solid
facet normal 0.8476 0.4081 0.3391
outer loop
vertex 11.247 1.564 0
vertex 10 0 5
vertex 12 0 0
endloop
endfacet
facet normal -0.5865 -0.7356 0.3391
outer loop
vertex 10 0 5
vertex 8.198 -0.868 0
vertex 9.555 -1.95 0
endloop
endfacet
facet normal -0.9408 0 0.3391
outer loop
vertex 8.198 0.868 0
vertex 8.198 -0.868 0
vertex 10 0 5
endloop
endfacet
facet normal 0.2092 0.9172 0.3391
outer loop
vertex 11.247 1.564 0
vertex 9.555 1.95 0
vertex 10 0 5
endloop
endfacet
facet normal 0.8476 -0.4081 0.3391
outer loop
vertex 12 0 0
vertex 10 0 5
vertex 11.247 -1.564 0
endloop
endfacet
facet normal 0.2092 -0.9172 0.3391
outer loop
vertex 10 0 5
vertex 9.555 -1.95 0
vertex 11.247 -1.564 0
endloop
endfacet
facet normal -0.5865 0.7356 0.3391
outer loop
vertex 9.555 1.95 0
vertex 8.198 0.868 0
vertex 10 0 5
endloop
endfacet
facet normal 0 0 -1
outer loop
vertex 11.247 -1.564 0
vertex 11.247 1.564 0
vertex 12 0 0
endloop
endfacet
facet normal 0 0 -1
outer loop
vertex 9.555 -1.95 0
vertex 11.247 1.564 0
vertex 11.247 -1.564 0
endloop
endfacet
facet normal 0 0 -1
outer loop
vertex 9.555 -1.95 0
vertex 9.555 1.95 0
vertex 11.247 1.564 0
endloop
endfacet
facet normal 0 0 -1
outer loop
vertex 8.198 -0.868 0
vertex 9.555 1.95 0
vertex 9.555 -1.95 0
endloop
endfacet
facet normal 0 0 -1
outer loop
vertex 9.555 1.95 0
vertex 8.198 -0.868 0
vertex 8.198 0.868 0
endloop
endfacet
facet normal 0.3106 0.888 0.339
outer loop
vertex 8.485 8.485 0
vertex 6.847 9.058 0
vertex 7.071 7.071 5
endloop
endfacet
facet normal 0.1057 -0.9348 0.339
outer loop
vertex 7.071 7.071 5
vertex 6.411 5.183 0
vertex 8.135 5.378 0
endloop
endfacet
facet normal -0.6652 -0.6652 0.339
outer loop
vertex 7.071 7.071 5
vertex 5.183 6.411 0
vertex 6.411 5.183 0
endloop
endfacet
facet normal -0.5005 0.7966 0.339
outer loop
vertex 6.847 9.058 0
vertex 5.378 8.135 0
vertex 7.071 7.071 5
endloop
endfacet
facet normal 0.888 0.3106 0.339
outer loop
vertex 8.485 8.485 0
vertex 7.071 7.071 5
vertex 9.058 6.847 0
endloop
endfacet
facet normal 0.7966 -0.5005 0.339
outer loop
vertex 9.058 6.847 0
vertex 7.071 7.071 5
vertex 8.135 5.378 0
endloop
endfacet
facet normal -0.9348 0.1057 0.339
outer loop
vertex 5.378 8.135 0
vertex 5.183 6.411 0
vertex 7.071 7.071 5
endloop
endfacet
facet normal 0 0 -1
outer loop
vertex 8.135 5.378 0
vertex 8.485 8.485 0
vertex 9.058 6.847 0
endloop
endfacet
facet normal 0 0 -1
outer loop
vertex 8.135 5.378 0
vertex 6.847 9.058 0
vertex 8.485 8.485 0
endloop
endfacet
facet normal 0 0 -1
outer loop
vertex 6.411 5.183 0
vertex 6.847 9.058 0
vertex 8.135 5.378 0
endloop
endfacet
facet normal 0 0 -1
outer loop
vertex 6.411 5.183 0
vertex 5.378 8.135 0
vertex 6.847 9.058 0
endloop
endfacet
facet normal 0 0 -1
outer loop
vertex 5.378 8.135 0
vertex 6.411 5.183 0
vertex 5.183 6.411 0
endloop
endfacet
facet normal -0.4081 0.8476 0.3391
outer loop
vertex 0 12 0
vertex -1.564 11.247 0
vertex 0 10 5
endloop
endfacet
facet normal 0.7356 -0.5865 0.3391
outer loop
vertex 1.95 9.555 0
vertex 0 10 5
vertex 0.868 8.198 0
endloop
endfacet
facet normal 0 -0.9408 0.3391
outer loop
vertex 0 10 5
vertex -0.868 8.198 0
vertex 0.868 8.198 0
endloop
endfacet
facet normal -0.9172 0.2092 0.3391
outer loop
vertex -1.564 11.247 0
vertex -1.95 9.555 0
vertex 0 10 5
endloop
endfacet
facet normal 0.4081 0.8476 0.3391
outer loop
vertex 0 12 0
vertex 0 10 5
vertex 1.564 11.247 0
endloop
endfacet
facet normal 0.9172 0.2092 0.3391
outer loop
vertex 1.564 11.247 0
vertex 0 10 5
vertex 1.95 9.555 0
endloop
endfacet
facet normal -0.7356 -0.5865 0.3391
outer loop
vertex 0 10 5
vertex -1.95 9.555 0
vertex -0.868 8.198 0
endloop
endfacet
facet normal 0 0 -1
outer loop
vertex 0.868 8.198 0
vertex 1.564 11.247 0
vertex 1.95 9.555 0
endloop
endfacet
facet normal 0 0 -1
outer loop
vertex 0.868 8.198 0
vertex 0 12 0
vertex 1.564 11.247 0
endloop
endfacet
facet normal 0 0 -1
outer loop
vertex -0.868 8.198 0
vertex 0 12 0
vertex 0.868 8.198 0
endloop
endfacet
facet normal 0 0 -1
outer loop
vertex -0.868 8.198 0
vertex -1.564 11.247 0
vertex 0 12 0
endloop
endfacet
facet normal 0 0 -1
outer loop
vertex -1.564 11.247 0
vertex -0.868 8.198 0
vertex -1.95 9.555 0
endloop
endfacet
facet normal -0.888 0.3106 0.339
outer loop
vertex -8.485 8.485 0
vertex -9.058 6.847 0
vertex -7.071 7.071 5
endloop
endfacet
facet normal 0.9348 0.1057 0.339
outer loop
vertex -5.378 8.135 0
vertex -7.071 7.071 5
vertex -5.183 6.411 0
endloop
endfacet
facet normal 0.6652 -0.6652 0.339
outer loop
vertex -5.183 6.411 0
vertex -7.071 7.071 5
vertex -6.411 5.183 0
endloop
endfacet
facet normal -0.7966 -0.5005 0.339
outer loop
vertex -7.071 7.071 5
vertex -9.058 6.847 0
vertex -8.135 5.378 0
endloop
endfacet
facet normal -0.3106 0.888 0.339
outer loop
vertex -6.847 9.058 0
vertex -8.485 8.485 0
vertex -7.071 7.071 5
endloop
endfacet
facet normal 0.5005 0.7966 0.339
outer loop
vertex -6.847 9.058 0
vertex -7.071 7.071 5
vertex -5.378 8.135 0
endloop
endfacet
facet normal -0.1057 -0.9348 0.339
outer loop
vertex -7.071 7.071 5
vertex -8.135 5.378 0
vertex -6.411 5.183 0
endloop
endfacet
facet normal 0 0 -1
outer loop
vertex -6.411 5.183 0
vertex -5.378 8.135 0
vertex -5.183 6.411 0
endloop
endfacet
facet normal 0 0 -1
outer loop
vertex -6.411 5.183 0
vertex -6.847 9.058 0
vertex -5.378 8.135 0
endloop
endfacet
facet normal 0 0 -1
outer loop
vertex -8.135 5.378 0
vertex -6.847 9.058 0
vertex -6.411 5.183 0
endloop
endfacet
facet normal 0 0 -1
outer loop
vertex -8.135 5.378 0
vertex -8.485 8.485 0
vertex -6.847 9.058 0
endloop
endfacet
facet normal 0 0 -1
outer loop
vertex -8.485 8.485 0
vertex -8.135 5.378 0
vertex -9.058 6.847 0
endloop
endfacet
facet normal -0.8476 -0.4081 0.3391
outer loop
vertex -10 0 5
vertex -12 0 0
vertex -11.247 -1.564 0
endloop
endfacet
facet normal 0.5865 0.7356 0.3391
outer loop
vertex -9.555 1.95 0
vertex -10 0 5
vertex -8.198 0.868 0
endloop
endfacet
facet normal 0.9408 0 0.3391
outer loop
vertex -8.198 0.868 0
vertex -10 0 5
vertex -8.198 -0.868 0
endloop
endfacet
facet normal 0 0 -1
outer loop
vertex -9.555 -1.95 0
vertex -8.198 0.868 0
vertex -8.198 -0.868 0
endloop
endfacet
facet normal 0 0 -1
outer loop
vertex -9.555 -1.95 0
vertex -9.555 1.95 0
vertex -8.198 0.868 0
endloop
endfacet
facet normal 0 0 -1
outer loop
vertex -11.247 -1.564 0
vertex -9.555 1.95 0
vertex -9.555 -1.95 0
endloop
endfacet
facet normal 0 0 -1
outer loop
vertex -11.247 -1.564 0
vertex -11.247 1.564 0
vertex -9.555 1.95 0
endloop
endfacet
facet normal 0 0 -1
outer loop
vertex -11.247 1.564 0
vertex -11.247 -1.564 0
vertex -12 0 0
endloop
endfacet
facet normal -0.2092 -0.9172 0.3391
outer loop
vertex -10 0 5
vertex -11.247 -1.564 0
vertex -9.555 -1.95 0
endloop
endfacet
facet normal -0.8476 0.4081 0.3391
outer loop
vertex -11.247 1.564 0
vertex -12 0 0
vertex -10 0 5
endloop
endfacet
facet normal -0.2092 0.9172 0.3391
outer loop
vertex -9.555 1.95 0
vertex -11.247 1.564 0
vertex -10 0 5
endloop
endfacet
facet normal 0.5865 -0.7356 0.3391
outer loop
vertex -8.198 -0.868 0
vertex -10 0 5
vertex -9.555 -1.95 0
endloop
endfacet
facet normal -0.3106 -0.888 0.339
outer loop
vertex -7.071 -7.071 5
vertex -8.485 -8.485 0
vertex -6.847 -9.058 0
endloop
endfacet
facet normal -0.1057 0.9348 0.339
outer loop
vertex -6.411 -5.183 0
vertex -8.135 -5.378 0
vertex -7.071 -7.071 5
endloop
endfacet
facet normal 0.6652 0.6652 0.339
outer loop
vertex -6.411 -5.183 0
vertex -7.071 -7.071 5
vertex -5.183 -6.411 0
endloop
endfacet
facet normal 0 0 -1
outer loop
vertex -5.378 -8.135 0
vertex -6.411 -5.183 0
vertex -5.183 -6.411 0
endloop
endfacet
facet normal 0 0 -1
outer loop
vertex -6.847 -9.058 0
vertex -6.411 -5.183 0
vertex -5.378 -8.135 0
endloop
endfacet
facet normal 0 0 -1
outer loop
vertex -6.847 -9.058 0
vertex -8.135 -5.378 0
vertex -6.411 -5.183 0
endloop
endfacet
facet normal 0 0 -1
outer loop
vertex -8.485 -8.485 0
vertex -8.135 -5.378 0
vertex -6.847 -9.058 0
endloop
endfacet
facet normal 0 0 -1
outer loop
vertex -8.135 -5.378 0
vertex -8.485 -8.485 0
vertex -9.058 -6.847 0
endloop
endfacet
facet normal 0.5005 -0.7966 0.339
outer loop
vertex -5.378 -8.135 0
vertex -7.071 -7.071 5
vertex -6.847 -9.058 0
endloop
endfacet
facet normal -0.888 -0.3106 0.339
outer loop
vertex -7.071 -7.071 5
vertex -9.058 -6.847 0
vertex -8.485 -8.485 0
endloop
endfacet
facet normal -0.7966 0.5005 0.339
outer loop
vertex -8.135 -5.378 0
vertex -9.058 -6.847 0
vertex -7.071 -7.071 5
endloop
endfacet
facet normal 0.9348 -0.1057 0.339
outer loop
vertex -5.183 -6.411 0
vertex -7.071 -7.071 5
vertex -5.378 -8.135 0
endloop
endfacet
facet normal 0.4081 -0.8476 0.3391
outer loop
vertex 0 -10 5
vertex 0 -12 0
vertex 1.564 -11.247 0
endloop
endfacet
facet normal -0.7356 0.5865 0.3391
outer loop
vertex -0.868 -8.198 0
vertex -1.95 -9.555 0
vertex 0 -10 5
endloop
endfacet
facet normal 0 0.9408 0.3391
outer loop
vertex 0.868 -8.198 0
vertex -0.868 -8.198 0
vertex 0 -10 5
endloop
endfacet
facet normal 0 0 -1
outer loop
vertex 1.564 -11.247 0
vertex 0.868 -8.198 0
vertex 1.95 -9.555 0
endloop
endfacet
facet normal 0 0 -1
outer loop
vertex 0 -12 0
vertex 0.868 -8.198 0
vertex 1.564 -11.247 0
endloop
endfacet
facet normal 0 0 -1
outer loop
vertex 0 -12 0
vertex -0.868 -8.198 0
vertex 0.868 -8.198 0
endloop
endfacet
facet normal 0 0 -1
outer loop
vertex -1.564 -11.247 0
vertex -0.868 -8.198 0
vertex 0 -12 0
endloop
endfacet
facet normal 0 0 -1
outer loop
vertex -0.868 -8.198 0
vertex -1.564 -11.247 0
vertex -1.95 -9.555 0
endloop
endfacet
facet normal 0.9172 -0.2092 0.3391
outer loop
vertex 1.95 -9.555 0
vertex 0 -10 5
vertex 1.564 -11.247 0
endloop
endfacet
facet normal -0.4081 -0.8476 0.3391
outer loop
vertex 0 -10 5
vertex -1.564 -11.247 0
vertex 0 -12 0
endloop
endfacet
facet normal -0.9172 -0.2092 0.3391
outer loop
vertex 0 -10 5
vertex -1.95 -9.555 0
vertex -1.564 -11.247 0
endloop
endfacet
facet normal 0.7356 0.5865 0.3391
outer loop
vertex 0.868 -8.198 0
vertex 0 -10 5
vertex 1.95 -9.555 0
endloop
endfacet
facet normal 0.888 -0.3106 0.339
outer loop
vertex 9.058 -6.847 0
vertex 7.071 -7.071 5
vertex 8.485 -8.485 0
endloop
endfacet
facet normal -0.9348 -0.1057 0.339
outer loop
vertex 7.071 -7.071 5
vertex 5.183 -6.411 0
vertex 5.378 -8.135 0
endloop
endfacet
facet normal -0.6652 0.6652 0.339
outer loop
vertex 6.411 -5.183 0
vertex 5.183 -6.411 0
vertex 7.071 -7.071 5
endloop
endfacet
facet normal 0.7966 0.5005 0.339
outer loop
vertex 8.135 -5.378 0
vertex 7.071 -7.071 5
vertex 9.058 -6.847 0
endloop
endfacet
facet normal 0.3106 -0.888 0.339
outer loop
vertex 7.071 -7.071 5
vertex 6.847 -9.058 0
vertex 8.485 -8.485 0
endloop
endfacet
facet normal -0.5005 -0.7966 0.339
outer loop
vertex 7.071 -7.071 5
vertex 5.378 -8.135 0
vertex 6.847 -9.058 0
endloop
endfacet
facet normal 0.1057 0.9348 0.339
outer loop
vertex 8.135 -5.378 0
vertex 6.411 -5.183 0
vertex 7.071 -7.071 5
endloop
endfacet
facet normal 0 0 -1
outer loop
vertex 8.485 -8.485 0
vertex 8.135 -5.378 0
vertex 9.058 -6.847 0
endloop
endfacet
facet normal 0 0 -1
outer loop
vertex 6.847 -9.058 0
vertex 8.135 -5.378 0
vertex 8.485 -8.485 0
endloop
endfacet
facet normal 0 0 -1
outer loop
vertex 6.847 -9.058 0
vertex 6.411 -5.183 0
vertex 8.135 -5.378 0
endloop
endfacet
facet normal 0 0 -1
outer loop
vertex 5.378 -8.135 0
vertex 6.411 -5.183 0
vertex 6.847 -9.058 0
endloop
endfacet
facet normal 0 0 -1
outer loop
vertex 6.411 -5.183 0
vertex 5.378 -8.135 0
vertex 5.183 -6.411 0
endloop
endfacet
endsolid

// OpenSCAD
for (angle=[0:45:315]) {
  rotate([0, 0, angle]) {
    translate([10, 0, 0]) {
      cylinder(h=5, r1=2, r2=0);
    }
  }
}
